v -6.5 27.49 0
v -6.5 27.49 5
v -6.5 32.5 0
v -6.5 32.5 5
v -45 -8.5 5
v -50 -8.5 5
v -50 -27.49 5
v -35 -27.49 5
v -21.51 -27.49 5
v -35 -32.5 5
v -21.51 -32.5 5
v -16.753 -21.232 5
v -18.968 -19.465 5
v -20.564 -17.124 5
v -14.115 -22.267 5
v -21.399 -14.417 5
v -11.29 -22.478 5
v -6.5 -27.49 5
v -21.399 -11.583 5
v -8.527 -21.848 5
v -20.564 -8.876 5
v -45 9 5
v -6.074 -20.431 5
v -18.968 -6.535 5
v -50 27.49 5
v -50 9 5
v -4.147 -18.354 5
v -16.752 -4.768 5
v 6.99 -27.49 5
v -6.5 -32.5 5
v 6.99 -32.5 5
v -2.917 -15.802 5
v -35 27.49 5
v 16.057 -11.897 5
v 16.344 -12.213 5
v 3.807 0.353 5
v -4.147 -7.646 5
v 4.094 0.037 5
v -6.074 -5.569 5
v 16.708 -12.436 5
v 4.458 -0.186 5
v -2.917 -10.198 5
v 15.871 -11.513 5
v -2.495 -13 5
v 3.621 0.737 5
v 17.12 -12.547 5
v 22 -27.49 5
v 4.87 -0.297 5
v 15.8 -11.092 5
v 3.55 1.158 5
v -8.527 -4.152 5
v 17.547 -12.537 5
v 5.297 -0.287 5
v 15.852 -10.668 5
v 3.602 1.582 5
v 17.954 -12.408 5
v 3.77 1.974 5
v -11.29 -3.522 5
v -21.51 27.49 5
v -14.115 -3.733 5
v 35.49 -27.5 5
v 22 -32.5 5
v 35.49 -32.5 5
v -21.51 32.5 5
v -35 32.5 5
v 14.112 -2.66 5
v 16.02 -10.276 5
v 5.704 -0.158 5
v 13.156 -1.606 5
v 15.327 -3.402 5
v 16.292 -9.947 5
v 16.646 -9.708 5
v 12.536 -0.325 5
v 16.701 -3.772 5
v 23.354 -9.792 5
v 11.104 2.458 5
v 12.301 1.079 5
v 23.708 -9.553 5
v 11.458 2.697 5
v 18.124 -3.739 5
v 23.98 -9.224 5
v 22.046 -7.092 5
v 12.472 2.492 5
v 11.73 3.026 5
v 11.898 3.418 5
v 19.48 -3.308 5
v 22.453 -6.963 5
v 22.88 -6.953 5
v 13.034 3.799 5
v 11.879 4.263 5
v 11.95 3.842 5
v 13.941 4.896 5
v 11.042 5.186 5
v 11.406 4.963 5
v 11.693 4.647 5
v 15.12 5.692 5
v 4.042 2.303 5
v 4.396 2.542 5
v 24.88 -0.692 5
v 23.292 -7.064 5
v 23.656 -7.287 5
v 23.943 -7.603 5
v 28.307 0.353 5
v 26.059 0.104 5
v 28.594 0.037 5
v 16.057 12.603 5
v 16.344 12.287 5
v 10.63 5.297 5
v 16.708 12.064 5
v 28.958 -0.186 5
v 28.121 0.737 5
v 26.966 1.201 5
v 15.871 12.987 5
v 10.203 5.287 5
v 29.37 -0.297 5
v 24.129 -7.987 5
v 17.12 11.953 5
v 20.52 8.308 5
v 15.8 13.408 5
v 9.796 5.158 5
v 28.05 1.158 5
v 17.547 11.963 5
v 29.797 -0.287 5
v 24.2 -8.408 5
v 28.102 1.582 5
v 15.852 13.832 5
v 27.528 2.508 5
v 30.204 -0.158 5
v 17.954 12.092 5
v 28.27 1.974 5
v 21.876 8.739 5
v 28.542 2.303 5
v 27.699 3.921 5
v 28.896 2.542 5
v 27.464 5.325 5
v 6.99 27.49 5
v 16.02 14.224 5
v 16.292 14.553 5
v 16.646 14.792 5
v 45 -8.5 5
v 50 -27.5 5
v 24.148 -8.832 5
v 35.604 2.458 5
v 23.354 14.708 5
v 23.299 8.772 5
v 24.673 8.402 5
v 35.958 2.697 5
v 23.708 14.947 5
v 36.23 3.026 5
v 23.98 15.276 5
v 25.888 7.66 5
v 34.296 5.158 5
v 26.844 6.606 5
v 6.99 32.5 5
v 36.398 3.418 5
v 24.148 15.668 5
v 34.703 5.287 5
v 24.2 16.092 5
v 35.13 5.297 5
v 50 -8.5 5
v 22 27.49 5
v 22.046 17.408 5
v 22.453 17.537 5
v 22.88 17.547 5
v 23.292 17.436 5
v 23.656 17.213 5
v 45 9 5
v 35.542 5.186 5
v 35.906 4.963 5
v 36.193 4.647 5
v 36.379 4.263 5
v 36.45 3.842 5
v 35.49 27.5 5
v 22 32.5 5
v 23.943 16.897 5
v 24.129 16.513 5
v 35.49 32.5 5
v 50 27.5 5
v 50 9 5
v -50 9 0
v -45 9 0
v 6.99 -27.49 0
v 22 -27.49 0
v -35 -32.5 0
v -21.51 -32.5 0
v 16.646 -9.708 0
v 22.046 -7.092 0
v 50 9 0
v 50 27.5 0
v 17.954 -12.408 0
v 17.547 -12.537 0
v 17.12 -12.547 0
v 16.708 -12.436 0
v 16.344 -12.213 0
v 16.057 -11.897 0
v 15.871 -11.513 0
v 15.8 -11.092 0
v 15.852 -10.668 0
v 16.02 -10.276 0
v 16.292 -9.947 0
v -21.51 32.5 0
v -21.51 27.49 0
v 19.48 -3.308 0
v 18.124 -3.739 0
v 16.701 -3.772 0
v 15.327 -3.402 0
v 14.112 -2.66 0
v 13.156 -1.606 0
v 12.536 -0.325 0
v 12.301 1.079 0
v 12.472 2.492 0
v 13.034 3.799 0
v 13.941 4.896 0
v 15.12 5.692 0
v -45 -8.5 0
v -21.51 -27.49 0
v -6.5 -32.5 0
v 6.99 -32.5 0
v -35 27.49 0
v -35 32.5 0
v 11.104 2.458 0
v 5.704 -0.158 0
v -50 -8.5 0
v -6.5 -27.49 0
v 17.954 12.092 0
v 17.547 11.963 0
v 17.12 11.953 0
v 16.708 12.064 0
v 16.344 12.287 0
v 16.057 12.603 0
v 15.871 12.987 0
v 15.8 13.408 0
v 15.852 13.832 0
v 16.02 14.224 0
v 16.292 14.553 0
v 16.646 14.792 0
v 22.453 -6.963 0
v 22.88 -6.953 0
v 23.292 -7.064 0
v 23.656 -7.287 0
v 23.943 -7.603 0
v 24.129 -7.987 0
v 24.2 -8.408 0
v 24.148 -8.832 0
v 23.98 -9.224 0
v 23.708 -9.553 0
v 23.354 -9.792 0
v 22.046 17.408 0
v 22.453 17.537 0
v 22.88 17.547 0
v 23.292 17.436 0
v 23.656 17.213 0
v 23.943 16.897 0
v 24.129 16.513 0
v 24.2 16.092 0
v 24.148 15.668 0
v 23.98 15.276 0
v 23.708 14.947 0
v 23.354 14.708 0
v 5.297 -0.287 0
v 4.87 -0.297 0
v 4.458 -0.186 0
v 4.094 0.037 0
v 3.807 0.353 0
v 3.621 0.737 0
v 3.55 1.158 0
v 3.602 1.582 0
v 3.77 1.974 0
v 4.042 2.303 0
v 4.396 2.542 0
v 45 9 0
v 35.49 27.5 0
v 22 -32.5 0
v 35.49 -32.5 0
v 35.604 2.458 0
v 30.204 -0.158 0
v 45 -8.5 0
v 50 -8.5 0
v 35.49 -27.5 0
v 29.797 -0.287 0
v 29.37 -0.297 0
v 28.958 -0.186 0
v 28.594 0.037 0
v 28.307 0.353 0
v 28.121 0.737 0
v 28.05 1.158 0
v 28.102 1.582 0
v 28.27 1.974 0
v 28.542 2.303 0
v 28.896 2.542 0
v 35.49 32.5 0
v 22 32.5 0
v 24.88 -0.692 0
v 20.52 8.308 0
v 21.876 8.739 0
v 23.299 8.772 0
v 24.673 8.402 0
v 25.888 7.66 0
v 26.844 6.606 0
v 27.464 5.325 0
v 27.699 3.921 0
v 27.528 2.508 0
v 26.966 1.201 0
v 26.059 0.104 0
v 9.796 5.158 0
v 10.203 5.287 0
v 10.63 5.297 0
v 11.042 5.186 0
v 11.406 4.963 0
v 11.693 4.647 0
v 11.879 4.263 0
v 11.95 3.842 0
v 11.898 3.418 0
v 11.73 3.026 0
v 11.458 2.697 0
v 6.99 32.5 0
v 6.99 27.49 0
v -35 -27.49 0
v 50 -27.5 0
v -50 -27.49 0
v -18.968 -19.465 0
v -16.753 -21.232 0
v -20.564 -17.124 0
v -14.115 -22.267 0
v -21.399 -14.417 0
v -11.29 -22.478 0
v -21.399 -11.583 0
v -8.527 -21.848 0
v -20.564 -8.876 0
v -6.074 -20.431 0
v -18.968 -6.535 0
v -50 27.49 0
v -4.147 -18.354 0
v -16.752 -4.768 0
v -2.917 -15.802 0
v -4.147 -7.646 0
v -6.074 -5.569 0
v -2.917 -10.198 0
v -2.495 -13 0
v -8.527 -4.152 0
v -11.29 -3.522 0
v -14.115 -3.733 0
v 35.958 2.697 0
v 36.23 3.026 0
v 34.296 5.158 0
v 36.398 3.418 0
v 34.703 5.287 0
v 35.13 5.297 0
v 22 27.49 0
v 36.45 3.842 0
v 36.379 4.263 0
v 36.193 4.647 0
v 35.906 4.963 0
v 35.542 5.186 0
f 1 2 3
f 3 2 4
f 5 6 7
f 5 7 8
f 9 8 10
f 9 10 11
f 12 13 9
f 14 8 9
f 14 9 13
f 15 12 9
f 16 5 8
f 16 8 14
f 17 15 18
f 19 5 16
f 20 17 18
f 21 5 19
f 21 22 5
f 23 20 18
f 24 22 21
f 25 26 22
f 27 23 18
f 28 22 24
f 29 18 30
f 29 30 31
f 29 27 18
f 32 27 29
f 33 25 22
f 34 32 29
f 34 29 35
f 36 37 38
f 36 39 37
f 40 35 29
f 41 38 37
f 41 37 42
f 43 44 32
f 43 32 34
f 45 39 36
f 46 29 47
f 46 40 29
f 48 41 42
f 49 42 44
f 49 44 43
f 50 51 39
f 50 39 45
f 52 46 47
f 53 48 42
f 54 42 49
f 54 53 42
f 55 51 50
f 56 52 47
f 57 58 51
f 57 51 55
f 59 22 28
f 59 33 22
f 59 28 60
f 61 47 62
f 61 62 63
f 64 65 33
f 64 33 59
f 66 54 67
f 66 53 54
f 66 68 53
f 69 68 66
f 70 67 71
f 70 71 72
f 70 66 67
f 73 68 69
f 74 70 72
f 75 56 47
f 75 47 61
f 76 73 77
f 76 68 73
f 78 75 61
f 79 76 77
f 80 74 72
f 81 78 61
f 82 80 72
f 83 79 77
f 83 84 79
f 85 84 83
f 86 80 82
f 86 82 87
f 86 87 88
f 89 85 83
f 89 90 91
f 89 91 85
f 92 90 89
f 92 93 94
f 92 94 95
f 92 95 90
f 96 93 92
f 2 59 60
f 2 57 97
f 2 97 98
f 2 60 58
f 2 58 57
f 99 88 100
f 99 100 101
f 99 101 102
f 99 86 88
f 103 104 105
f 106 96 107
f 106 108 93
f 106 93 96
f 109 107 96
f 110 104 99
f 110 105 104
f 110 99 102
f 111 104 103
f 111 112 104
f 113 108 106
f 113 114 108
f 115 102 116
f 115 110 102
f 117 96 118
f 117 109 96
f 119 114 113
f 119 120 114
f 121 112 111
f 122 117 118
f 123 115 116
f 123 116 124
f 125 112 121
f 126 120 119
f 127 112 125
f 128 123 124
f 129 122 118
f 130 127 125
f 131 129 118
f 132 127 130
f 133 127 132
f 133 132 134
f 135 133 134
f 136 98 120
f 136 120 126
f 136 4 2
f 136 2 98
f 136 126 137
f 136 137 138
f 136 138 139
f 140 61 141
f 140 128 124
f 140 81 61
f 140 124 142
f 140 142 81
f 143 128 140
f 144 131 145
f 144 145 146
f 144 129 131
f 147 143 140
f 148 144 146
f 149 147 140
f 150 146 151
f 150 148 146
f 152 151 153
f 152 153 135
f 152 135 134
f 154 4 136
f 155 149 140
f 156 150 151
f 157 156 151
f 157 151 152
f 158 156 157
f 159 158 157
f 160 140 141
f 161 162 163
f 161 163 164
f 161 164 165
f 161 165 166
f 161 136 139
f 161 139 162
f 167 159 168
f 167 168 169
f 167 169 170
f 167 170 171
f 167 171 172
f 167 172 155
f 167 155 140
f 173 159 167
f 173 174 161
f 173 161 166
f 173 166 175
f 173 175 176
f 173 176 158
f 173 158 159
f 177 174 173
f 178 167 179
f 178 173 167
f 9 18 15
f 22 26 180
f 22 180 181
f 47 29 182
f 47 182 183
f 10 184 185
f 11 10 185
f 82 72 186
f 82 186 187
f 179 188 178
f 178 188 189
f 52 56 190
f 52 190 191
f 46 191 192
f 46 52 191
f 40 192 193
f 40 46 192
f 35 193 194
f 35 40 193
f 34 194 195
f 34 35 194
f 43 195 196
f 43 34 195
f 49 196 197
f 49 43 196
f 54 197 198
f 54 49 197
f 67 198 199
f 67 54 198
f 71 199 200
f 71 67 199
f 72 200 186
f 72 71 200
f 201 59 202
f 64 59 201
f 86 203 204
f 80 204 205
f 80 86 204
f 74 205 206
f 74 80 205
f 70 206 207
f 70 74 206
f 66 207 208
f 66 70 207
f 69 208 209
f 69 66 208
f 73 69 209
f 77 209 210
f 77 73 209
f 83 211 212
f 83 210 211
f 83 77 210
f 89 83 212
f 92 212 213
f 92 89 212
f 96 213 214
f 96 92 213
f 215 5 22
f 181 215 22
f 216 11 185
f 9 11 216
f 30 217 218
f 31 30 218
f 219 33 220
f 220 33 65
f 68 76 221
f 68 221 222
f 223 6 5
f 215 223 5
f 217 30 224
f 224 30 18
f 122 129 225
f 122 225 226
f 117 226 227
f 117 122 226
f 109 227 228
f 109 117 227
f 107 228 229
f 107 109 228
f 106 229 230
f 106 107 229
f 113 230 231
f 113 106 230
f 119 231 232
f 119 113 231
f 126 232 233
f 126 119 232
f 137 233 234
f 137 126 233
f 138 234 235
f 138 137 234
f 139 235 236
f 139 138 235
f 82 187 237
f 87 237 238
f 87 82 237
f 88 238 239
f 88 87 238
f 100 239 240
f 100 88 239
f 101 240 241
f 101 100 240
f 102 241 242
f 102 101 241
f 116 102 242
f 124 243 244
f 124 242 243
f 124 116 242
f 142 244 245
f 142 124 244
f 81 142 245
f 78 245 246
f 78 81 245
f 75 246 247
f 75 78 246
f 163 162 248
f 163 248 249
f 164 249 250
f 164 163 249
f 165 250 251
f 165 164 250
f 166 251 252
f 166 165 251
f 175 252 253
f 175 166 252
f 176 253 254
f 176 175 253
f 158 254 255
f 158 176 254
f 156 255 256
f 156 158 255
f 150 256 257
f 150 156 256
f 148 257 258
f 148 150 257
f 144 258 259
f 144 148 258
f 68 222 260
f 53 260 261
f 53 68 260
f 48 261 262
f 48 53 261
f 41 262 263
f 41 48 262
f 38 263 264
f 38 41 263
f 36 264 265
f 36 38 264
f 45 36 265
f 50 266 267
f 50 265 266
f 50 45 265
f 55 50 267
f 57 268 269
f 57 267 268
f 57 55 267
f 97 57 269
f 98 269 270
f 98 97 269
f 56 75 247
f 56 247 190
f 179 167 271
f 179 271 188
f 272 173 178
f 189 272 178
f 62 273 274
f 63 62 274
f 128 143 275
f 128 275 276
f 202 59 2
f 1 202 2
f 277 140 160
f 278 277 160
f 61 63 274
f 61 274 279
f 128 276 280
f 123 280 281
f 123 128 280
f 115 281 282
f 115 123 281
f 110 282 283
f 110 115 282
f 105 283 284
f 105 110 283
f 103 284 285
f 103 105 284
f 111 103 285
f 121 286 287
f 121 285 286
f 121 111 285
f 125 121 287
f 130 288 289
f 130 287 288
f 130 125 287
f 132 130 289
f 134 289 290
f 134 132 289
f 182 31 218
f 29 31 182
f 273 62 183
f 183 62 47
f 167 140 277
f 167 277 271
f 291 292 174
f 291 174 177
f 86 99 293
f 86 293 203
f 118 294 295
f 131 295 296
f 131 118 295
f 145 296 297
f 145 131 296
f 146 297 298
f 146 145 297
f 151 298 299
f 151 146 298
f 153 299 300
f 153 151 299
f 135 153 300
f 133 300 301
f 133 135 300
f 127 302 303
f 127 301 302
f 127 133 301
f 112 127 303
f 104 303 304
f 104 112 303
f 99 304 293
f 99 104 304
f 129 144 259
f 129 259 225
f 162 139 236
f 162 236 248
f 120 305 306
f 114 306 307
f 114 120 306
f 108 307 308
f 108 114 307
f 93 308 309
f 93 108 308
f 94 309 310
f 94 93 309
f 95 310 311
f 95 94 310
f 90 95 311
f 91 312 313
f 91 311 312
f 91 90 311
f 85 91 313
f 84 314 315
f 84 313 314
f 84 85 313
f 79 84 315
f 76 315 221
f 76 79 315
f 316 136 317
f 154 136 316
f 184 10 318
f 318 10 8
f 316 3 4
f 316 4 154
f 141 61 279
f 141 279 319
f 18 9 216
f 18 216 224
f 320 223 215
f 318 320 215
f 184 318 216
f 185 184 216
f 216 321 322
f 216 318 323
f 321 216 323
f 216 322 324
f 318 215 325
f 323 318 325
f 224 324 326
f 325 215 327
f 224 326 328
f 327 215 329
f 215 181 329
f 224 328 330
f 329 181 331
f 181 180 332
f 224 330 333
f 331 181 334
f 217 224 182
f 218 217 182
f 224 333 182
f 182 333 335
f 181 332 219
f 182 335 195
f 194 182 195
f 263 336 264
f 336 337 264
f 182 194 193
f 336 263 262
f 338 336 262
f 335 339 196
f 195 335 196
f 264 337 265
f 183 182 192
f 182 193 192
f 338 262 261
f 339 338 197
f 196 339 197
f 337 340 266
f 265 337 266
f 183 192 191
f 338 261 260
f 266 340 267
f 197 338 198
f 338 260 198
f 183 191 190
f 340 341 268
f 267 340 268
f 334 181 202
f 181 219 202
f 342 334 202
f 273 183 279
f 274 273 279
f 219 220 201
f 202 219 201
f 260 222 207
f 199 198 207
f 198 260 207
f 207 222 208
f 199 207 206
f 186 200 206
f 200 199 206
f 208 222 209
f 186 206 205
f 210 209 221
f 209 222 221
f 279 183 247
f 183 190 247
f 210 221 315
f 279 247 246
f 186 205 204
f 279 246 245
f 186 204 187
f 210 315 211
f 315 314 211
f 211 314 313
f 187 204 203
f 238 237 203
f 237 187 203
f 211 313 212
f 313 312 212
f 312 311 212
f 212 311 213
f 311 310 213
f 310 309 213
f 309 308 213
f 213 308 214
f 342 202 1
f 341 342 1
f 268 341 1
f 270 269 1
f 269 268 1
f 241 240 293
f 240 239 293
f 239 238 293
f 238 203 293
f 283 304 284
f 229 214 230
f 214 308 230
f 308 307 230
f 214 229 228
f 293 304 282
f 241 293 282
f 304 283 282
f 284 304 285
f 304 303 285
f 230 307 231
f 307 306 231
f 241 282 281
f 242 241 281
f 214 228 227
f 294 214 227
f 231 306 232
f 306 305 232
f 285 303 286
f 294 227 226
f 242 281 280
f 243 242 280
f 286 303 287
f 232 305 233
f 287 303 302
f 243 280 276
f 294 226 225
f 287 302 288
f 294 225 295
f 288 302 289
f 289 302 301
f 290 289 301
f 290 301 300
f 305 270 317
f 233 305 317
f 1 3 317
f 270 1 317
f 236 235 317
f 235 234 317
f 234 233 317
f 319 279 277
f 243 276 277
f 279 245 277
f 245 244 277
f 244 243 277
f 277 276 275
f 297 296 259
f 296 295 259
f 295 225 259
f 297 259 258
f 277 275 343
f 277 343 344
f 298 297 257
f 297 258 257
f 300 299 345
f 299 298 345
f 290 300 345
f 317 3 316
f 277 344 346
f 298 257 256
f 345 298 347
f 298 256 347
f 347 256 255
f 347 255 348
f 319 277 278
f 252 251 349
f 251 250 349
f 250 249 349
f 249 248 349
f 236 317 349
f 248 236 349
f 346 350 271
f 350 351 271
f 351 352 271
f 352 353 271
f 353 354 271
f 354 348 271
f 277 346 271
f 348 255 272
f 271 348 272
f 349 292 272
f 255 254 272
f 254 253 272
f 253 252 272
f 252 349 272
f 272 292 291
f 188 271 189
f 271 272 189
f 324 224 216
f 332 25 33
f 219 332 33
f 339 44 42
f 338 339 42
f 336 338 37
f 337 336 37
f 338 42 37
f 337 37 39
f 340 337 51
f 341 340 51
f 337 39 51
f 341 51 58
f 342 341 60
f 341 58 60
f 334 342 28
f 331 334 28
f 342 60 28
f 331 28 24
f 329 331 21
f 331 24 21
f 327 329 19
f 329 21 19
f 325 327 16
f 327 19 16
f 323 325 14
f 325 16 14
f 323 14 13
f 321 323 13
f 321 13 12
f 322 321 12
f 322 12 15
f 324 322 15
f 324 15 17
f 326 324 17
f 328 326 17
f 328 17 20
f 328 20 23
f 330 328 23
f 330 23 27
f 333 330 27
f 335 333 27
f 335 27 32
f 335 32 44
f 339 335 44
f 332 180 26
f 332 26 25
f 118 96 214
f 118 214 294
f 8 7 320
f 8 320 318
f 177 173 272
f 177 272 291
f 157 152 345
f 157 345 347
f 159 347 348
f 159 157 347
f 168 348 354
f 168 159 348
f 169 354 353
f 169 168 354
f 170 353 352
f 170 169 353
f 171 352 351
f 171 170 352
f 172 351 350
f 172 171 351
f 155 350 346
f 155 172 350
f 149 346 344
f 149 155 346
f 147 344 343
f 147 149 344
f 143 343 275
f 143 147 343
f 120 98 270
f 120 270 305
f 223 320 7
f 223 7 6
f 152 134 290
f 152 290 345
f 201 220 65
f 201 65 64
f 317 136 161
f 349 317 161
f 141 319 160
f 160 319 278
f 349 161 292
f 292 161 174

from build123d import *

# Parameters (mm, degrees)
ESQUISSE1_W             = 100
ESQUISSE1_H             = 65
BOSS_EXTRU_1_DEPTH      = 5
ESQUISSE2_W             = 15
ESQUISSE2_H             = 5.01
ESQUISSE2_W_2           = 15.01
ESQUISSE2_W_3           = 14.51
ESQUISSE2_H_2           = 5
ESQUISSE2_W_4           = 5
ESQUISSE2_H_3           = 17.5
ENL_V_MAT_EXTRU_1_DEPTH = 5
ESQUISSE7_R             = 9.505
ENL_V_MAT_EXTRU_5_DEPTH = 10
ENL_V_MAT_EXTRU_6_DEPTH = 10


with BuildPart() as part:
    # Esquisse1 → Boss.-Extru.1 (new body)
    with BuildSketch(Plane.XY):
        Rectangle(ESQUISSE1_W, ESQUISSE1_H)
    extrude(amount=BOSS_EXTRU_1_DEPTH)

    # Esquisse2 → Enlèv. mat.-Extru.1 (cut)
    with BuildSketch(Plane.XY.offset(5)):
        with Locations((-42.5, 29.995)):
            Rectangle(ESQUISSE2_W, ESQUISSE2_H)
        with Locations((-14.005, 29.995)):
            Rectangle(ESQUISSE2_W_2, ESQUISSE2_H)
        with Locations((14.495, 29.995)):
            Rectangle(ESQUISSE2_W_2, ESQUISSE2_H)
        with Locations((42.745, 30)):
            Rectangle(ESQUISSE2_W_3, ESQUISSE2_H_2)
        with Locations((-47.5, 0.25)):
            Rectangle(ESQUISSE2_W_4, ESQUISSE2_H_3)
        with Locations((47.5, 0.25)):
            Rectangle(ESQUISSE2_W_4, ESQUISSE2_H_3)
        with Locations((42.745, -30)):
            Rectangle(ESQUISSE2_W_3, ESQUISSE2_H_2)
        with Locations((14.495, -29.995)):
            Rectangle(ESQUISSE2_W_2, ESQUISSE2_H)
        with Locations((-14.005, -29.995)):
            Rectangle(ESQUISSE2_W_2, ESQUISSE2_H)
        with Locations((-42.5, -29.995)):
            Rectangle(ESQUISSE2_W, ESQUISSE2_H)
    extrude(amount=-ENL_V_MAT_EXTRU_1_DEPTH, mode=Mode.SUBTRACT)

    # Esquisse7 → Enlèv. mat.-Extru.5 (cut)
    with BuildSketch(Plane.XY.offset(5)):
        with Locations((-12, -13)):
            Circle(ESQUISSE7_R)
    extrude(amount=-ENL_V_MAT_EXTRU_5_DEPTH, mode=Mode.SUBTRACT)

    # Esquisse8 → Enlèv. mat.-Extru.6 (cut)
    with BuildSketch(Plane.XY.offset(5)):
        with BuildLine():
            Line((24.87958624, -0.692121258), (19.479698297, -3.30769198))
            ThreePointArc((19.479698297, -3.30769198), (12.800149409, -0.98742763), (15.12041376, 5.692121258))
            Line((15.12041376, 5.692121258), (20.520301703, 8.30769198))
            ThreePointArc((20.520301703, 8.30769198), (27.199850591, 5.98742763), (24.87958624, -0.692121258))
        make_face()
        with BuildLine():
            Line((23.353836652, 14.707813375), (17.953948709, 12.092242653))
            ThreePointArc((17.953948709, 12.092242653), (15.950084043, 12.788321958), (16.646163348, 14.792186625))
            Line((16.646163348, 14.792186625), (22.046051291, 17.407757347))
            ThreePointArc((22.046051291, 17.407757347), (24.049915957, 16.711678042), (23.353836652, 14.707813375))
        make_face()
        with BuildLine():
            Line((23.353836652, -9.792186625), (17.953948709, -12.407757347))
            ThreePointArc((17.953948709, -12.407757347), (15.950084043, -11.711678042), (16.646163348, -9.707813375))
            Line((16.646163348, -9.707813375), (22.046051291, -7.092242653))
            ThreePointArc((22.046051291, -7.092242653), (24.049915957, -7.788321958), (23.353836652, -9.792186625))
        make_face()
        with BuildLine():
            Line((11.103836652, 2.457813375), (5.703948709, -0.157757347))
            ThreePointArc((5.703948709, -0.157757347), (3.700084043, 0.538321958), (4.396163348, 2.542186625))
            Line((4.396163348, 2.542186625), (9.796051291, 5.157757347))
            ThreePointArc((9.796051291, 5.157757347), (11.799915957, 4.461678042), (11.103836652, 2.457813375))
        make_face()
        with BuildLine():
            Line((35.603836652, 2.457813375), (30.203948709, -0.157757347))
            ThreePointArc((30.203948709, -0.157757347), (28.200084043, 0.538321958), (28.896163348, 2.542186625))
            Line((28.896163348, 2.542186625), (34.296051291, 5.157757347))
            ThreePointArc((34.296051291, 5.157757347), (36.299915957, 4.461678042), (35.603836652, 2.457813375))
        make_face()
    extrude(amount=-ENL_V_MAT_EXTRU_6_DEPTH, mode=Mode.SUBTRACT)


solid = part.part
